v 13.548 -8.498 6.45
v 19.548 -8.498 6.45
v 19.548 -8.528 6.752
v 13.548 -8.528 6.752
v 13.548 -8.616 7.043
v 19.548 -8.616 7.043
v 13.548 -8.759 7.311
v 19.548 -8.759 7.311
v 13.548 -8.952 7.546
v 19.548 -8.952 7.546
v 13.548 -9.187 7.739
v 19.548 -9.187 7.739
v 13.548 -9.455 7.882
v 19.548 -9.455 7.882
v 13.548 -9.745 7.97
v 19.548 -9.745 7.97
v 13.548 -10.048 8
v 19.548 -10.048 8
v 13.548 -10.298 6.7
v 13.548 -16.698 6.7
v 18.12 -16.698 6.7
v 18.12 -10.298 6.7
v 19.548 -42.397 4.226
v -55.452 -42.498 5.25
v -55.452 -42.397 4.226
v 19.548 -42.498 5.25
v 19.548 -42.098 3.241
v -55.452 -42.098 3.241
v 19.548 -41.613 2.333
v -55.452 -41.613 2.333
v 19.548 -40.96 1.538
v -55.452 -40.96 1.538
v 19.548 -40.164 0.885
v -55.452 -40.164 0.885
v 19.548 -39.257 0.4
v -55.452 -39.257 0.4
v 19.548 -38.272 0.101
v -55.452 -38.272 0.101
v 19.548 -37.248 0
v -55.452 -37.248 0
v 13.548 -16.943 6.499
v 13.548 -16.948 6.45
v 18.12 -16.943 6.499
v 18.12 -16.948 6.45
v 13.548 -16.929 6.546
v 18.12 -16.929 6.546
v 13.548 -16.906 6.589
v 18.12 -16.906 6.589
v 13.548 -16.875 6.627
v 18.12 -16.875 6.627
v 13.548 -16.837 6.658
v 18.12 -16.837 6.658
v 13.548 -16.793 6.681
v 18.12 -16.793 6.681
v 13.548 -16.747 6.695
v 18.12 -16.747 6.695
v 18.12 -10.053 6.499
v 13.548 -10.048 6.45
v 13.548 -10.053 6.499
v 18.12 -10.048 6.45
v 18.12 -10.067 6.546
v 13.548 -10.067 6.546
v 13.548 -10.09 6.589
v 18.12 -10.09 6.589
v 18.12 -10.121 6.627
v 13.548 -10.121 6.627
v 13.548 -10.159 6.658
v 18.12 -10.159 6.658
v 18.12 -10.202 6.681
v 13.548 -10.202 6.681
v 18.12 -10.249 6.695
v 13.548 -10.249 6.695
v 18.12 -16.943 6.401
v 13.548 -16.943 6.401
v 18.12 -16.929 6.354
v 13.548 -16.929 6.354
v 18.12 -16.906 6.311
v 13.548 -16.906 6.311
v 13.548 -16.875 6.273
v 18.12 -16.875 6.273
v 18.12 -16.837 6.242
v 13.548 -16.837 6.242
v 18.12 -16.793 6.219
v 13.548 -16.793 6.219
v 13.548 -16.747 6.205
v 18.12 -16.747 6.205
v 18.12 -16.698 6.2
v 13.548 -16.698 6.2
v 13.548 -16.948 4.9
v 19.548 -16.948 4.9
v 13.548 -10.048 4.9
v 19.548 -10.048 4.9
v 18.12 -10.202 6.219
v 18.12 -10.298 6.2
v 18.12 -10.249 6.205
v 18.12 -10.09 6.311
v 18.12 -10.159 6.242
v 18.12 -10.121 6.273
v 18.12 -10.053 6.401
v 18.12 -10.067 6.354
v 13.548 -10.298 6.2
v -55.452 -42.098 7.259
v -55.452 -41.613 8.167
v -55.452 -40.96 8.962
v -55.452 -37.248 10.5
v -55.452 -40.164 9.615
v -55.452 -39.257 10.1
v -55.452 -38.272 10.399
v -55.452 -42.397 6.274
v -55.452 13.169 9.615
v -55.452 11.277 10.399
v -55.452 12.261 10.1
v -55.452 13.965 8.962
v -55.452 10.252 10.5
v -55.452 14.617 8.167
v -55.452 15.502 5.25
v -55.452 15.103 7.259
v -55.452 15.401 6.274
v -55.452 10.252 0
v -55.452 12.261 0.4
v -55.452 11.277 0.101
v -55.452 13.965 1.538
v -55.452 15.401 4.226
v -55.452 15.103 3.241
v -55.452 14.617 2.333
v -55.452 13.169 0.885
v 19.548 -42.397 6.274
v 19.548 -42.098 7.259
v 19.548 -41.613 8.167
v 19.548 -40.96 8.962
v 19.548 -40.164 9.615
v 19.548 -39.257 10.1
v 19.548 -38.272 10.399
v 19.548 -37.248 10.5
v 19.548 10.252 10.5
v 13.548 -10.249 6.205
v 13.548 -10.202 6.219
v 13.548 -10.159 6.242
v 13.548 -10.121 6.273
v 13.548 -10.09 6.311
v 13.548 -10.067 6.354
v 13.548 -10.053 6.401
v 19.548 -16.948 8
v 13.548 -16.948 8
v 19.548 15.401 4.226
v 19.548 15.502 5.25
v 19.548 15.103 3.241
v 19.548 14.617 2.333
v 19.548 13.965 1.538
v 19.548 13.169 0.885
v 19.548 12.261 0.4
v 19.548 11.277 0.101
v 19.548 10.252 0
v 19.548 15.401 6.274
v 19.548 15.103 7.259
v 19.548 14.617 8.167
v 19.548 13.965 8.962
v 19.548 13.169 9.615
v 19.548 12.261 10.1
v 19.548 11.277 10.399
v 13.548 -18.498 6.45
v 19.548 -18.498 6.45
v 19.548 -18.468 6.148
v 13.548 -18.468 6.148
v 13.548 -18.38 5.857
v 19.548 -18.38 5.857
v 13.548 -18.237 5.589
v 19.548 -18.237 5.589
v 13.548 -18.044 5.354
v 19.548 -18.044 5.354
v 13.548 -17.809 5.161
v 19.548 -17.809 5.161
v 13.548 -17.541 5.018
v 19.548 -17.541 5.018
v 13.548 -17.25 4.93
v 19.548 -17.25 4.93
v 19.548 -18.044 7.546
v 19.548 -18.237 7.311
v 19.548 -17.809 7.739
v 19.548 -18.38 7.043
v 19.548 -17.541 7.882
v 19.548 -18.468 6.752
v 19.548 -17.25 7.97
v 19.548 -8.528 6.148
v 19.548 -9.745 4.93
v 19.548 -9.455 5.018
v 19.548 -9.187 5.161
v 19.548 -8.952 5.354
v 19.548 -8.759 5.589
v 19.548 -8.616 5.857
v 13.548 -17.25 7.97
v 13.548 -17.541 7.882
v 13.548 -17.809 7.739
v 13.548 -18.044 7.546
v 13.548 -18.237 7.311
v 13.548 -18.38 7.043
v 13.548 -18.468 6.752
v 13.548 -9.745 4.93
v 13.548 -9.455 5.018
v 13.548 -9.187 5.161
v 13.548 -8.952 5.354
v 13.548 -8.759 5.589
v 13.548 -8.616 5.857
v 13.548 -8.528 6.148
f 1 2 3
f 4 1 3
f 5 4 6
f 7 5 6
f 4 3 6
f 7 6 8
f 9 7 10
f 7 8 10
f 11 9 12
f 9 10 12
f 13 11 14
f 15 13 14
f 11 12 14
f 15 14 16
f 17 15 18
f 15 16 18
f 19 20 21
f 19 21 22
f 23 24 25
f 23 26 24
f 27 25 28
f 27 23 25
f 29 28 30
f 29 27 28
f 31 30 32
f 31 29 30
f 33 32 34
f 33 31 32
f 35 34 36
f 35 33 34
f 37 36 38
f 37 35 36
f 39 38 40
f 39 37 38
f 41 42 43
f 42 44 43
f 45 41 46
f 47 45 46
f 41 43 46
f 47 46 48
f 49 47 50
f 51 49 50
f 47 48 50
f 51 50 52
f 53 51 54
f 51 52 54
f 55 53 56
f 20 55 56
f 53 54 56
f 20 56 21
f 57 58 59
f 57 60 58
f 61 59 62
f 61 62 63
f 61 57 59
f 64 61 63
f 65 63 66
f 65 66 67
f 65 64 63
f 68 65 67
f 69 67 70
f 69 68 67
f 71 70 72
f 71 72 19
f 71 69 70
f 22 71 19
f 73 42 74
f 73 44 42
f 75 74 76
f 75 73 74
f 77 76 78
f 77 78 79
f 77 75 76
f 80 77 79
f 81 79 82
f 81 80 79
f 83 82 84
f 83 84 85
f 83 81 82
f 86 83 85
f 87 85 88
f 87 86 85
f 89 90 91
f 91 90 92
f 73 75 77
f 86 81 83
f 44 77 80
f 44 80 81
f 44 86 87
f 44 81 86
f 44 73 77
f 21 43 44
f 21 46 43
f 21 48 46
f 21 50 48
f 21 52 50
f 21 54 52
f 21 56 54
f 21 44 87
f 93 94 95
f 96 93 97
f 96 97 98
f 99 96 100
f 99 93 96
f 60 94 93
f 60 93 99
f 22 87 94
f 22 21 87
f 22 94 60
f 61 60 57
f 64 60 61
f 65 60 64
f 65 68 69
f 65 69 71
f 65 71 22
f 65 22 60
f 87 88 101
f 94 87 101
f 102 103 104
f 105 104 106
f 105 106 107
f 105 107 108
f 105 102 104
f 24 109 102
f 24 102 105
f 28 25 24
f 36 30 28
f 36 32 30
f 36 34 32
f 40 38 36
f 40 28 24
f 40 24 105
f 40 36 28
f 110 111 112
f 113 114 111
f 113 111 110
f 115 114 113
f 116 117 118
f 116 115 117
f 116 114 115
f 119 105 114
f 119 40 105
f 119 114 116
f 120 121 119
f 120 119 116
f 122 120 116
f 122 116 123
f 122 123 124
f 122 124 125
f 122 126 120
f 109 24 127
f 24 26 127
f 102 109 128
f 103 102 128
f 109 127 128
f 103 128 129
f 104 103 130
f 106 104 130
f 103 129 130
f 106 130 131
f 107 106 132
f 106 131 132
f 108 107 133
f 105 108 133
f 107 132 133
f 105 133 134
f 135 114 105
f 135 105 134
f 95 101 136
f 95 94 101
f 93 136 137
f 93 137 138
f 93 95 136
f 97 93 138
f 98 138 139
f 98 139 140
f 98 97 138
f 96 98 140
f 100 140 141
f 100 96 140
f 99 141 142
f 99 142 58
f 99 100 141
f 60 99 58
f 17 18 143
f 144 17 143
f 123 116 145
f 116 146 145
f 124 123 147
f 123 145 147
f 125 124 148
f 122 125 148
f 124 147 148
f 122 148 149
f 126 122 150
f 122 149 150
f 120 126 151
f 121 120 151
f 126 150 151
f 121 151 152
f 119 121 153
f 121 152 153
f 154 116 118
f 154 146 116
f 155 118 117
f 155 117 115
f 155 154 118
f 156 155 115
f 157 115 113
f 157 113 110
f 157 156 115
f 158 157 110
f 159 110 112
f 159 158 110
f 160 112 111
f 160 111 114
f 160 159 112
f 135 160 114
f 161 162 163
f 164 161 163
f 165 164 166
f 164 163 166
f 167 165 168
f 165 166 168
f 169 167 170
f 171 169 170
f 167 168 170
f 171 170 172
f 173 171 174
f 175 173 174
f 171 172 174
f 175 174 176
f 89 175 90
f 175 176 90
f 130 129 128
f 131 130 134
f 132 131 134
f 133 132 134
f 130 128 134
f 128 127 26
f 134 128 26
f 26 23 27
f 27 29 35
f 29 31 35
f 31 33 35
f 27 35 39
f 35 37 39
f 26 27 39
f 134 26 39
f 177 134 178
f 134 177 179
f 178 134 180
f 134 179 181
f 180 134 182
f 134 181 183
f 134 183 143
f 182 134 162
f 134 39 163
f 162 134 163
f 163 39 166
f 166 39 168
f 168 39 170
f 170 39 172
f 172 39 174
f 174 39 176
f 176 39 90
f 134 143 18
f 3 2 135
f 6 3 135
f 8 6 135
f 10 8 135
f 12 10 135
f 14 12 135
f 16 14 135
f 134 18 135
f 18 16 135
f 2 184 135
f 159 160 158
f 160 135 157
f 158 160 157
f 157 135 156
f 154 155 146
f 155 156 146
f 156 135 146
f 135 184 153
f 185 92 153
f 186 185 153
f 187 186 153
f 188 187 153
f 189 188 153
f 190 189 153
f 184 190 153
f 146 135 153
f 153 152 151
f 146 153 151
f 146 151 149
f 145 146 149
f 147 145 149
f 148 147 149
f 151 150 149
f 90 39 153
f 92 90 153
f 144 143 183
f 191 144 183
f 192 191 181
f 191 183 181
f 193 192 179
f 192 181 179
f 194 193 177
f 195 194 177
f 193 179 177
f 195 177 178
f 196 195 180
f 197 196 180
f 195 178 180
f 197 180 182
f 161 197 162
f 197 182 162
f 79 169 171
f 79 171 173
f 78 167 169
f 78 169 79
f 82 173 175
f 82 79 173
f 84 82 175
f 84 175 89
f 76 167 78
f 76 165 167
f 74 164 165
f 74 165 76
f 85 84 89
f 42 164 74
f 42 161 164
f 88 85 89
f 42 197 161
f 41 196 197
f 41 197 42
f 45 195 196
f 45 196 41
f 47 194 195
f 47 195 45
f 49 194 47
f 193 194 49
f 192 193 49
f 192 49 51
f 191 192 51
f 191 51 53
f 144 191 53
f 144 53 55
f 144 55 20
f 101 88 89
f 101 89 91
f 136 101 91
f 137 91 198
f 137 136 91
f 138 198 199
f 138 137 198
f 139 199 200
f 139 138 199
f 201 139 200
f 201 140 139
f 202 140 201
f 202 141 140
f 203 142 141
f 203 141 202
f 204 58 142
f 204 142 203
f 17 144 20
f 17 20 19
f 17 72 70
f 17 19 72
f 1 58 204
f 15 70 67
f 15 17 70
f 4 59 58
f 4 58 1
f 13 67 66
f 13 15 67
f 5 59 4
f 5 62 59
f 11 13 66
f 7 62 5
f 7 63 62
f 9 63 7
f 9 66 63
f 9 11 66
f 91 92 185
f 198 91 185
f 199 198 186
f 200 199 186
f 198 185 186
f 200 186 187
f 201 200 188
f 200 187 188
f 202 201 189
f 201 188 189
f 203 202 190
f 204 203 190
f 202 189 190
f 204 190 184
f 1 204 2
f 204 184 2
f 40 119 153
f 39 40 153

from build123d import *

# Parameters (mm, degrees)
F0_W     = 75
F0_H     = 58
F1_DEPTH = 10.5
F3_R     = 5.24999
F4_DEPTH = 6
F5_W     = 6.9
F5_H     = 0.25
F6_DEPTH = 4.572
F7_R     = 0.24999


# Not quite as in the source:
# - a fillet or chamfer is up to 0.001 mm smaller than in the source, because OpenCascade refuses the exact size


with BuildPart() as f1:
    # F0 (on Top) → F1 (new body)
    with BuildSketch(Plane.XY):
        with Locations((-17.9516240954, -13.4977242947)):
            Rectangle(F0_W, F0_H)
    extrude(amount=F1_DEPTH)

    # F3 (radius 5.25 in the source; OpenCascade refuses exactly that, so slightly less here)
    f3_edges = [f1.edges().sort_by_distance(p)[0] for p in [
        (-17.951624, -42.497724, 10.5),
        (-17.951624, -42.497724, 0),
        (-17.951624, 15.502276, 10.5),
        (-17.951624, 15.502276, 0),
    ]]
    fillet(f3_edges, radius=F3_R)

    # F2 (on face) → F4 (cut)
    with BuildSketch(Plane.YZ.offset(19.5483759046)):
        with BuildLine():
            Line((-10.0477242947, 8), (-13.4977242947, 8))
            Line((-13.4977242947, 8), (-16.9477242947, 8))
            ThreePointArc((-16.9477242947, 8), (-15.8517087838, 7.5460155108), (-15.3977242947, 6.45))
            ThreePointArc((-15.3977242947, 6.45), (-15.8517087838, 5.3539844892), (-16.9477242947, 4.9))
            Line((-16.9477242947, 4.9), (-10.0477242947, 4.9))
            ThreePointArc((-10.0477242947, 4.9), (-11.5977242947, 6.45), (-10.0477242947, 8))
        make_face()
        with BuildLine():
            Line((-10.0477242947, 4.9), (-10.0477242947, 8))
            ThreePointArc((-10.0477242947, 8), (-11.5977242947, 6.45), (-10.0477242947, 4.9))
        make_face()
        with BuildLine():
            ThreePointArc((-8.4977242947, 6.45), (-8.9517087838, 7.5460155108), (-10.0477242947, 8))
            Line((-10.0477242947, 8), (-10.0477242947, 4.9))
            ThreePointArc((-10.0477242947, 4.9), (-8.9517087838, 5.3539844892), (-8.4977242947, 6.45))
        make_face()
        with BuildLine():
            ThreePointArc((-15.3977242947, 6.45), (-15.8517087838, 7.5460155108), (-16.9477242947, 8))
            Line((-16.9477242947, 8), (-16.9477242947, 4.9))
            ThreePointArc((-16.9477242947, 4.9), (-15.8517087838, 5.3539844892), (-15.3977242947, 6.45))
        make_face()
        with BuildLine():
            Line((-16.9477242947, 4.9), (-16.9477242947, 8))
            ThreePointArc((-16.9477242947, 8), (-18.0437398055, 7.5460155108), (-18.4977242947, 6.45))
            ThreePointArc((-18.4977242947, 6.45), (-18.0437398055, 5.3539844892), (-16.9477242947, 4.9))
        make_face()
    extrude(amount=-F4_DEPTH, mode=Mode.SUBTRACT)

    # F5 (on face) → F6 (join)
    with BuildSketch(Plane.YZ.offset(13.5483759046)):
        with Locations((-13.4977242947, 6.575)):
            Rectangle(F5_W, F5_H)
        with Locations((-13.4977242947, 6.325)):
            Rectangle(F5_W, F5_H)
    extrude(amount=F6_DEPTH)

    # F7 (radius 0.25 in the source; OpenCascade refuses exactly that, so slightly less here)
    f7_edges = [f1.edges().sort_by_distance(p)[0] for p in [
        (15.834376, -10.047724, 6.7),
        (15.834376, -10.047724, 6.2),
        (15.834376, -16.947724, 6.7),
        (15.834376, -16.947724, 6.2),
    ]]
    fillet(f7_edges, radius=F7_R)


solid = f1.part
